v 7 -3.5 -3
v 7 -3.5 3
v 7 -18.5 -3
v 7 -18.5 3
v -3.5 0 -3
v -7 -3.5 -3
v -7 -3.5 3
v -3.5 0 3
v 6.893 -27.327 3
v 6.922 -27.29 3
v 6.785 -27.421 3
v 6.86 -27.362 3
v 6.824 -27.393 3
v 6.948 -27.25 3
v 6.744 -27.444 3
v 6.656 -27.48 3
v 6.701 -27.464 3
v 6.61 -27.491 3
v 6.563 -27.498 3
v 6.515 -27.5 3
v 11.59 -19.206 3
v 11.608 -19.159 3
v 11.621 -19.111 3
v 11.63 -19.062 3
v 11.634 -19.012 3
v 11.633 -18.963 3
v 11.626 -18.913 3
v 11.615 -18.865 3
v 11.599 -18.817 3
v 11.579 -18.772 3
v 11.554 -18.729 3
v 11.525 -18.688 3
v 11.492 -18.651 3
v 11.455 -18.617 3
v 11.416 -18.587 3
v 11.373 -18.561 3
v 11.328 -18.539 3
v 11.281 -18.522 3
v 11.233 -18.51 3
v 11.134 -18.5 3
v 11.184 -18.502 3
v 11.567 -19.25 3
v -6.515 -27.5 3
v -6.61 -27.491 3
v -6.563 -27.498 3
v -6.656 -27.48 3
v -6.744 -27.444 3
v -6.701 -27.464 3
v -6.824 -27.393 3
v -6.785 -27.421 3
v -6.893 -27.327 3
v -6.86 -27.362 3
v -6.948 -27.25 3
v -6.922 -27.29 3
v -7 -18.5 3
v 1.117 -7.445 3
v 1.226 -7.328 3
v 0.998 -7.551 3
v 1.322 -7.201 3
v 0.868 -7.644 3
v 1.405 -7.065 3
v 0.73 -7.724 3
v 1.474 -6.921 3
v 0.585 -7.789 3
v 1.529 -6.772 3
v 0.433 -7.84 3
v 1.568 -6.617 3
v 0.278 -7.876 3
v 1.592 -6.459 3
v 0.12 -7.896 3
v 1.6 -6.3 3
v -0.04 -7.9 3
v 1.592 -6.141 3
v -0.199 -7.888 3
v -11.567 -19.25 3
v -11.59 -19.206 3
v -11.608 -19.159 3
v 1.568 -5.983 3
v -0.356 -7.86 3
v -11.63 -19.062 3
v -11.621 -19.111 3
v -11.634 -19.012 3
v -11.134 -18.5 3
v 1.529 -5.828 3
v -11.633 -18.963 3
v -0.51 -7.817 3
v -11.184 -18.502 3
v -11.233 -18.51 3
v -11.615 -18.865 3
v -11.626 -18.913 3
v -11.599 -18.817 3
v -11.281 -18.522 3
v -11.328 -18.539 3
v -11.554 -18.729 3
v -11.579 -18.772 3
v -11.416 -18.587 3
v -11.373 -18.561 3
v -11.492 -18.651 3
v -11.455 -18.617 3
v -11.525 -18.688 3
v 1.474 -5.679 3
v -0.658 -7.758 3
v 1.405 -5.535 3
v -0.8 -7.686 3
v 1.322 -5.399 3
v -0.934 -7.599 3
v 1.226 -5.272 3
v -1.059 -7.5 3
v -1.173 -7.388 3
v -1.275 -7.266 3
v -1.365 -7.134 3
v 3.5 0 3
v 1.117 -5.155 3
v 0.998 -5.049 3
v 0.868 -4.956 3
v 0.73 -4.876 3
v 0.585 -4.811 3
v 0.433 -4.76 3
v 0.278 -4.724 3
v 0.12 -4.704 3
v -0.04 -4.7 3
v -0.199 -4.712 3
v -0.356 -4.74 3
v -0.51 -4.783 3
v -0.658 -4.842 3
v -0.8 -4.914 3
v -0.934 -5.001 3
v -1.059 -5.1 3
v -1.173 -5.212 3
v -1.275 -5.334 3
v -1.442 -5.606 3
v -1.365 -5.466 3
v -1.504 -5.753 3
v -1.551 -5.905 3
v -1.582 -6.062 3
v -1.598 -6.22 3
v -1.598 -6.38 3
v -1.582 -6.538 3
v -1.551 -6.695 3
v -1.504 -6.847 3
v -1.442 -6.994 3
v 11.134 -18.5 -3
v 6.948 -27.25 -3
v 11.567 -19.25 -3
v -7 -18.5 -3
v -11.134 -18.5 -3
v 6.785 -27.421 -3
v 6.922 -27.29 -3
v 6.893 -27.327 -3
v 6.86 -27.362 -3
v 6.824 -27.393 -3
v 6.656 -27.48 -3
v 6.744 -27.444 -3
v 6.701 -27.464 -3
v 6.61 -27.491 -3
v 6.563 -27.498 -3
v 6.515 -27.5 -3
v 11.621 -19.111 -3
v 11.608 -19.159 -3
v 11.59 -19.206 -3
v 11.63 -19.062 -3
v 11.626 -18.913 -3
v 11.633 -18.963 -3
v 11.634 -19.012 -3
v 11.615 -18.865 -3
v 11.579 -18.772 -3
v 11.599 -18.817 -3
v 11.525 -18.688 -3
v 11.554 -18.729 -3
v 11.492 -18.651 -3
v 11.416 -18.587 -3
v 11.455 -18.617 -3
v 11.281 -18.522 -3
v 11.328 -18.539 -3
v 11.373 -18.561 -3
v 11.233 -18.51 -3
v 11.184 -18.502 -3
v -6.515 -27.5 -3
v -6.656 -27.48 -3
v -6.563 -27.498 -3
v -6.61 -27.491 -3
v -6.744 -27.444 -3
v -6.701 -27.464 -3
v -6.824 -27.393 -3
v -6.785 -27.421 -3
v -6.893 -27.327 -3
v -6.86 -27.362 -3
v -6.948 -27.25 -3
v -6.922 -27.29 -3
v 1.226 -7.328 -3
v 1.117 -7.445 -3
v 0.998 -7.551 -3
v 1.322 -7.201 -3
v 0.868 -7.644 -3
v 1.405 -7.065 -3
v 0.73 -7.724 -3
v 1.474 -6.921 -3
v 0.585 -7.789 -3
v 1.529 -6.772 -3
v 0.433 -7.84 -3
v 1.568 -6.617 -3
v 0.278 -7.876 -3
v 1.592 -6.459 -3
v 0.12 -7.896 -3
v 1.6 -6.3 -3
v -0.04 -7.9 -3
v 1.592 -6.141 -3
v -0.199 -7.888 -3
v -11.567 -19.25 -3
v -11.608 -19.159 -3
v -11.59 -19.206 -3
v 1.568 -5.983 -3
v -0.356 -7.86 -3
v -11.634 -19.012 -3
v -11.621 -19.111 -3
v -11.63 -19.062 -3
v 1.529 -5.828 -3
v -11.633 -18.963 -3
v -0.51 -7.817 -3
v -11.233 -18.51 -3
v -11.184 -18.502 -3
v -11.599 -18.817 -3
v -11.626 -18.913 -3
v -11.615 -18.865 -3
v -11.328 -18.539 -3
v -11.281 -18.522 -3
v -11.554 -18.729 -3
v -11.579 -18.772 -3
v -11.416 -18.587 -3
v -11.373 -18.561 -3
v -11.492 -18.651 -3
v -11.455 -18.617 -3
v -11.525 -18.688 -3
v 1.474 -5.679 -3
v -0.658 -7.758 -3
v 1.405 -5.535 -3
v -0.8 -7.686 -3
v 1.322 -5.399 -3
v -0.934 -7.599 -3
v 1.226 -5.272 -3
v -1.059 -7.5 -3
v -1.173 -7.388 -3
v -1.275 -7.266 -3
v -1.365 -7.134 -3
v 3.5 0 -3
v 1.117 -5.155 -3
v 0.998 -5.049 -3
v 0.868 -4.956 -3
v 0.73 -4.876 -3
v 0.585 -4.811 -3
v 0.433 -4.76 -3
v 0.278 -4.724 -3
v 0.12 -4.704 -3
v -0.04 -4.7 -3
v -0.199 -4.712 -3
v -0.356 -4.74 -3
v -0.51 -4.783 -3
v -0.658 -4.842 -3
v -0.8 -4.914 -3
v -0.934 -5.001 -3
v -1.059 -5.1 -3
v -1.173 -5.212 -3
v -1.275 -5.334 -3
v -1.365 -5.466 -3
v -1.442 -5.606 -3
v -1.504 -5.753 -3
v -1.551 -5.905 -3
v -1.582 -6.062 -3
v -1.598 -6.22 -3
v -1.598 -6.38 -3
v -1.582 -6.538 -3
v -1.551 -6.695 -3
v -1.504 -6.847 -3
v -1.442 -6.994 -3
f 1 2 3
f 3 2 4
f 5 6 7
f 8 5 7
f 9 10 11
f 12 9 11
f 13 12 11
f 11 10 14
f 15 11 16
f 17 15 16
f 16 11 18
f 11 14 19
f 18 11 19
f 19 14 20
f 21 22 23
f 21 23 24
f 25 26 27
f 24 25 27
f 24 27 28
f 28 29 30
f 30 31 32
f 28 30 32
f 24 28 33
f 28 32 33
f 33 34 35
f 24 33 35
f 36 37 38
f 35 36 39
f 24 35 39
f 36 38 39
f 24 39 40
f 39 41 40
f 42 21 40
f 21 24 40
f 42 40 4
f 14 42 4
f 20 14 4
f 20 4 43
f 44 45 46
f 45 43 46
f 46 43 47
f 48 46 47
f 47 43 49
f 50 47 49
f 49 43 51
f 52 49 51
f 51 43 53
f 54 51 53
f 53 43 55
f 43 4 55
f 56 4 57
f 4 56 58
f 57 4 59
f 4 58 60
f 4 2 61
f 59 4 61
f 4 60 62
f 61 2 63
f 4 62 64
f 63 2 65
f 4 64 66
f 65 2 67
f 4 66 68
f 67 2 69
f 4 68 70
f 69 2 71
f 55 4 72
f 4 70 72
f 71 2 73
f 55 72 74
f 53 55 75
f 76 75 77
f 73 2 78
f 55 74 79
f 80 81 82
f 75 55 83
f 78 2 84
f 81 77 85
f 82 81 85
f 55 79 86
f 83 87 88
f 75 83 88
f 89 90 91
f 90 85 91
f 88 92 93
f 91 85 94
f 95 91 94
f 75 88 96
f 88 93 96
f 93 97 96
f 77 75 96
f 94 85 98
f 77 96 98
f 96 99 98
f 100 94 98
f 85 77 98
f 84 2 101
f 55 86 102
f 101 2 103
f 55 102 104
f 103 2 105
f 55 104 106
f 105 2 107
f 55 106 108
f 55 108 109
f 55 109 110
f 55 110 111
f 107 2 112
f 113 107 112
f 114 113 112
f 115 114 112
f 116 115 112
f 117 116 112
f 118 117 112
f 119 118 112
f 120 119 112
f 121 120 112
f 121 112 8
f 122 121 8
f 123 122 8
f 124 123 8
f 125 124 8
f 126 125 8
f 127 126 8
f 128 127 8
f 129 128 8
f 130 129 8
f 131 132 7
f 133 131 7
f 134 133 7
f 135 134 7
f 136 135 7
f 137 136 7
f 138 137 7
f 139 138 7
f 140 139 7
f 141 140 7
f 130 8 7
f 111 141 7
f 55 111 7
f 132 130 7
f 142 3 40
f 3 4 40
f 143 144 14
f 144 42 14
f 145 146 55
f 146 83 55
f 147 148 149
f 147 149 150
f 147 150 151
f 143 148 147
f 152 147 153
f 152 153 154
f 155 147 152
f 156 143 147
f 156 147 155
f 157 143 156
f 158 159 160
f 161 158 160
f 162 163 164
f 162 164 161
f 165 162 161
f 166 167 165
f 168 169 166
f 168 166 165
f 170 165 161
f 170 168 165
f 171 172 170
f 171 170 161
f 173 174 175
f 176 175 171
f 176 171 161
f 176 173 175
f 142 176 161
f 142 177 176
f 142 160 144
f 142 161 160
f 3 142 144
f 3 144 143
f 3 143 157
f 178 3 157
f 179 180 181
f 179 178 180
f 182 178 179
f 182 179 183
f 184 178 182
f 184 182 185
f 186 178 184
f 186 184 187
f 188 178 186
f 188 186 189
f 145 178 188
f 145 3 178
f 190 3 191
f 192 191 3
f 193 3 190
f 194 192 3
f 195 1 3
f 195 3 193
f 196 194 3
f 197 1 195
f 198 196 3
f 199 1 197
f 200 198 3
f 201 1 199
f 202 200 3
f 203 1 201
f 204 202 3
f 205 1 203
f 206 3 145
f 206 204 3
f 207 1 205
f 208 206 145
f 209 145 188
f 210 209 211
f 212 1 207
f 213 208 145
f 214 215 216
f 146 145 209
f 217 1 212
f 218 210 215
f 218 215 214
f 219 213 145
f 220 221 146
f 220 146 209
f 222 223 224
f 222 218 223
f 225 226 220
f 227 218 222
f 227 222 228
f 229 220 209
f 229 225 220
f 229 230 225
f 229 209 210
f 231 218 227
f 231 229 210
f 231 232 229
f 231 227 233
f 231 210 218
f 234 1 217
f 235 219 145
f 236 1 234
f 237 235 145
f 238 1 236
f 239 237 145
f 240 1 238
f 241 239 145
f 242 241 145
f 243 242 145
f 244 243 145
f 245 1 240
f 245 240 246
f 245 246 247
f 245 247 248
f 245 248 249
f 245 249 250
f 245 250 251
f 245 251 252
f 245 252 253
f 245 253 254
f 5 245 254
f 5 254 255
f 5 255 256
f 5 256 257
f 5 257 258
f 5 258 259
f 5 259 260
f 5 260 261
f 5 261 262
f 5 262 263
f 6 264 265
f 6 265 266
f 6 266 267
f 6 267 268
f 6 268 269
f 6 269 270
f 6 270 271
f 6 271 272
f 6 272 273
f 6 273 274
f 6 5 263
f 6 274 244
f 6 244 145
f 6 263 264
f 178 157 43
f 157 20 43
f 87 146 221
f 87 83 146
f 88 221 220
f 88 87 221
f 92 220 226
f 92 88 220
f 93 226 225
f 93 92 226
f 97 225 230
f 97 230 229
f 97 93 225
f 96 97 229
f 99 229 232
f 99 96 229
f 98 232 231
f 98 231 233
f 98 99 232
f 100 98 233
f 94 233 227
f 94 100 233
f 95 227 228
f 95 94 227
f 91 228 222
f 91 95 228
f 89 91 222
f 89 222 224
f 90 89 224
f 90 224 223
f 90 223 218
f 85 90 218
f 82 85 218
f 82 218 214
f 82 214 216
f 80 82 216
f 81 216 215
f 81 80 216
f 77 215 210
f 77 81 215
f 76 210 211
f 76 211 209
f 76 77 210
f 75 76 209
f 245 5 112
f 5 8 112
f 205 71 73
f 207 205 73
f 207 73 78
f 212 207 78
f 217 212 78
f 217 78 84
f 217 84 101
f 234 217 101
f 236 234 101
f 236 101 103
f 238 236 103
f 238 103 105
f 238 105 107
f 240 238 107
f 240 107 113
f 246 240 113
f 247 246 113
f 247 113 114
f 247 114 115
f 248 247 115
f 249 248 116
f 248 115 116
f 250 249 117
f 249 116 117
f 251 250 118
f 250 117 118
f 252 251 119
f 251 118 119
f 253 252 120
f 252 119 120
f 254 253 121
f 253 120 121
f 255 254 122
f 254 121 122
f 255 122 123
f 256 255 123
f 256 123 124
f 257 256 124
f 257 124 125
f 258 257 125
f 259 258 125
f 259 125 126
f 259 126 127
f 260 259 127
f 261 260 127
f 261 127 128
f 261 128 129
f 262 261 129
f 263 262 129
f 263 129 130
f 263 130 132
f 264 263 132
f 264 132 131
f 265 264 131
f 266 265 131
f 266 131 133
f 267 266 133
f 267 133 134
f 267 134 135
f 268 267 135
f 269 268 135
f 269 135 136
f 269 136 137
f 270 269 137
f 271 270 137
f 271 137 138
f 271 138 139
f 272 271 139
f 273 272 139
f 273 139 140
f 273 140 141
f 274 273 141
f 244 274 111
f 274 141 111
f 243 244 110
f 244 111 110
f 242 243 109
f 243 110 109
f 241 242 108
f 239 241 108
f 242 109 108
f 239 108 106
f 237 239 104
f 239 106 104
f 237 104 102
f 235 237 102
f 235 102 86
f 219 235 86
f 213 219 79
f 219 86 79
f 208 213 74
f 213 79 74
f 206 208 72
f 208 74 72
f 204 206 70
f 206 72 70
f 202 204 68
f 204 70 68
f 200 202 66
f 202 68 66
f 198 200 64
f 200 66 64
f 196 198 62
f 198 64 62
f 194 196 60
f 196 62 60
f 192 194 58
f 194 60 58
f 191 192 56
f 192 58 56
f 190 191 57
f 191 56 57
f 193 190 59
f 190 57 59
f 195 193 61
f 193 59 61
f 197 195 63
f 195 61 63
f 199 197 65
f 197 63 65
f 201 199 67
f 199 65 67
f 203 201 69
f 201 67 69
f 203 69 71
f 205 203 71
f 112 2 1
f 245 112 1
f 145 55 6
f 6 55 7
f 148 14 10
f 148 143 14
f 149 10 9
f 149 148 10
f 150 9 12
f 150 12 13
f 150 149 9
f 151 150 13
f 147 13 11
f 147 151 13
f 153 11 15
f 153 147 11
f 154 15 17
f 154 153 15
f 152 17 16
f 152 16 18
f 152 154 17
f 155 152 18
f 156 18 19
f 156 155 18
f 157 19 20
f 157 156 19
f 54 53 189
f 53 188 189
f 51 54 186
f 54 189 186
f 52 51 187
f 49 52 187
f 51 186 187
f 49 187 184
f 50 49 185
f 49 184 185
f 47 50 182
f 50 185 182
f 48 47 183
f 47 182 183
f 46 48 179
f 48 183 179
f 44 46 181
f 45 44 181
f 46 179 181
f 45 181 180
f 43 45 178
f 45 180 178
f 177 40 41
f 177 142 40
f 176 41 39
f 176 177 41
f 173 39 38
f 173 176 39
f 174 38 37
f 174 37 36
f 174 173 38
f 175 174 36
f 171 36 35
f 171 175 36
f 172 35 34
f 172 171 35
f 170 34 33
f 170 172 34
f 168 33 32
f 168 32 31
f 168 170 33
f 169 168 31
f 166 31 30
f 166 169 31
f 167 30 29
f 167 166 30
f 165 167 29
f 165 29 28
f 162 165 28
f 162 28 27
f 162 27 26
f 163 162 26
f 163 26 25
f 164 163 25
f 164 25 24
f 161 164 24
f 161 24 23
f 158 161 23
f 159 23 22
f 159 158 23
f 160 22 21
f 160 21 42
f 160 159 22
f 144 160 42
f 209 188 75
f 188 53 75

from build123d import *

# Parameters (mm, degrees)
BOSS_EXTRUDE1_DEPTH = 3
SKETCH2_R           = 1.6
CUT_EXTRUDE1_DEPTH  = 7
CHAMFER1_SIZE       = 3.5
FILLET1_R           = 0.5


with BuildPart() as part:
    # Sketch1 → Boss-Extrude1 (new body, symmetric)
    with BuildSketch(Plane.XY):
        Polygon((-7, 0), (7, 0), (7, -18.5), (12, -18.5), (6.803847577, -27.5), (-6.803847577, -27.5), (-12, -18.5), (-7, -18.5), align=None)
    extrude(amount=BOSS_EXTRUDE1_DEPTH, both=True)

    # Sketch2 → Cut-Extrude1 (cut, through all)
    with BuildSketch(Plane.XY.offset(3)):
        with Locations((0, -6.3)):
            Circle(SKETCH2_R)
    extrude(amount=-CUT_EXTRUDE1_DEPTH, mode=Mode.SUBTRACT)

    # Chamfer1
    chamfer1_edges = [part.edges().sort_by_distance(p)[0] for p in [
        (-7, 0, 0),
        (7, 0, 0),
    ]]
    chamfer(chamfer1_edges, length=CHAMFER1_SIZE)

    # Fillet1
    fillet1_edges = [part.edges().sort_by_distance(p)[0] for p in [
        (12, -18.5, 0),
        (6.803847577, -27.5, 0),
        (-6.803847577, -27.5, 0),
        (-12, -18.5, 0),
    ]]
    fillet(fillet1_edges, radius=FILLET1_R)


solid = part.part
